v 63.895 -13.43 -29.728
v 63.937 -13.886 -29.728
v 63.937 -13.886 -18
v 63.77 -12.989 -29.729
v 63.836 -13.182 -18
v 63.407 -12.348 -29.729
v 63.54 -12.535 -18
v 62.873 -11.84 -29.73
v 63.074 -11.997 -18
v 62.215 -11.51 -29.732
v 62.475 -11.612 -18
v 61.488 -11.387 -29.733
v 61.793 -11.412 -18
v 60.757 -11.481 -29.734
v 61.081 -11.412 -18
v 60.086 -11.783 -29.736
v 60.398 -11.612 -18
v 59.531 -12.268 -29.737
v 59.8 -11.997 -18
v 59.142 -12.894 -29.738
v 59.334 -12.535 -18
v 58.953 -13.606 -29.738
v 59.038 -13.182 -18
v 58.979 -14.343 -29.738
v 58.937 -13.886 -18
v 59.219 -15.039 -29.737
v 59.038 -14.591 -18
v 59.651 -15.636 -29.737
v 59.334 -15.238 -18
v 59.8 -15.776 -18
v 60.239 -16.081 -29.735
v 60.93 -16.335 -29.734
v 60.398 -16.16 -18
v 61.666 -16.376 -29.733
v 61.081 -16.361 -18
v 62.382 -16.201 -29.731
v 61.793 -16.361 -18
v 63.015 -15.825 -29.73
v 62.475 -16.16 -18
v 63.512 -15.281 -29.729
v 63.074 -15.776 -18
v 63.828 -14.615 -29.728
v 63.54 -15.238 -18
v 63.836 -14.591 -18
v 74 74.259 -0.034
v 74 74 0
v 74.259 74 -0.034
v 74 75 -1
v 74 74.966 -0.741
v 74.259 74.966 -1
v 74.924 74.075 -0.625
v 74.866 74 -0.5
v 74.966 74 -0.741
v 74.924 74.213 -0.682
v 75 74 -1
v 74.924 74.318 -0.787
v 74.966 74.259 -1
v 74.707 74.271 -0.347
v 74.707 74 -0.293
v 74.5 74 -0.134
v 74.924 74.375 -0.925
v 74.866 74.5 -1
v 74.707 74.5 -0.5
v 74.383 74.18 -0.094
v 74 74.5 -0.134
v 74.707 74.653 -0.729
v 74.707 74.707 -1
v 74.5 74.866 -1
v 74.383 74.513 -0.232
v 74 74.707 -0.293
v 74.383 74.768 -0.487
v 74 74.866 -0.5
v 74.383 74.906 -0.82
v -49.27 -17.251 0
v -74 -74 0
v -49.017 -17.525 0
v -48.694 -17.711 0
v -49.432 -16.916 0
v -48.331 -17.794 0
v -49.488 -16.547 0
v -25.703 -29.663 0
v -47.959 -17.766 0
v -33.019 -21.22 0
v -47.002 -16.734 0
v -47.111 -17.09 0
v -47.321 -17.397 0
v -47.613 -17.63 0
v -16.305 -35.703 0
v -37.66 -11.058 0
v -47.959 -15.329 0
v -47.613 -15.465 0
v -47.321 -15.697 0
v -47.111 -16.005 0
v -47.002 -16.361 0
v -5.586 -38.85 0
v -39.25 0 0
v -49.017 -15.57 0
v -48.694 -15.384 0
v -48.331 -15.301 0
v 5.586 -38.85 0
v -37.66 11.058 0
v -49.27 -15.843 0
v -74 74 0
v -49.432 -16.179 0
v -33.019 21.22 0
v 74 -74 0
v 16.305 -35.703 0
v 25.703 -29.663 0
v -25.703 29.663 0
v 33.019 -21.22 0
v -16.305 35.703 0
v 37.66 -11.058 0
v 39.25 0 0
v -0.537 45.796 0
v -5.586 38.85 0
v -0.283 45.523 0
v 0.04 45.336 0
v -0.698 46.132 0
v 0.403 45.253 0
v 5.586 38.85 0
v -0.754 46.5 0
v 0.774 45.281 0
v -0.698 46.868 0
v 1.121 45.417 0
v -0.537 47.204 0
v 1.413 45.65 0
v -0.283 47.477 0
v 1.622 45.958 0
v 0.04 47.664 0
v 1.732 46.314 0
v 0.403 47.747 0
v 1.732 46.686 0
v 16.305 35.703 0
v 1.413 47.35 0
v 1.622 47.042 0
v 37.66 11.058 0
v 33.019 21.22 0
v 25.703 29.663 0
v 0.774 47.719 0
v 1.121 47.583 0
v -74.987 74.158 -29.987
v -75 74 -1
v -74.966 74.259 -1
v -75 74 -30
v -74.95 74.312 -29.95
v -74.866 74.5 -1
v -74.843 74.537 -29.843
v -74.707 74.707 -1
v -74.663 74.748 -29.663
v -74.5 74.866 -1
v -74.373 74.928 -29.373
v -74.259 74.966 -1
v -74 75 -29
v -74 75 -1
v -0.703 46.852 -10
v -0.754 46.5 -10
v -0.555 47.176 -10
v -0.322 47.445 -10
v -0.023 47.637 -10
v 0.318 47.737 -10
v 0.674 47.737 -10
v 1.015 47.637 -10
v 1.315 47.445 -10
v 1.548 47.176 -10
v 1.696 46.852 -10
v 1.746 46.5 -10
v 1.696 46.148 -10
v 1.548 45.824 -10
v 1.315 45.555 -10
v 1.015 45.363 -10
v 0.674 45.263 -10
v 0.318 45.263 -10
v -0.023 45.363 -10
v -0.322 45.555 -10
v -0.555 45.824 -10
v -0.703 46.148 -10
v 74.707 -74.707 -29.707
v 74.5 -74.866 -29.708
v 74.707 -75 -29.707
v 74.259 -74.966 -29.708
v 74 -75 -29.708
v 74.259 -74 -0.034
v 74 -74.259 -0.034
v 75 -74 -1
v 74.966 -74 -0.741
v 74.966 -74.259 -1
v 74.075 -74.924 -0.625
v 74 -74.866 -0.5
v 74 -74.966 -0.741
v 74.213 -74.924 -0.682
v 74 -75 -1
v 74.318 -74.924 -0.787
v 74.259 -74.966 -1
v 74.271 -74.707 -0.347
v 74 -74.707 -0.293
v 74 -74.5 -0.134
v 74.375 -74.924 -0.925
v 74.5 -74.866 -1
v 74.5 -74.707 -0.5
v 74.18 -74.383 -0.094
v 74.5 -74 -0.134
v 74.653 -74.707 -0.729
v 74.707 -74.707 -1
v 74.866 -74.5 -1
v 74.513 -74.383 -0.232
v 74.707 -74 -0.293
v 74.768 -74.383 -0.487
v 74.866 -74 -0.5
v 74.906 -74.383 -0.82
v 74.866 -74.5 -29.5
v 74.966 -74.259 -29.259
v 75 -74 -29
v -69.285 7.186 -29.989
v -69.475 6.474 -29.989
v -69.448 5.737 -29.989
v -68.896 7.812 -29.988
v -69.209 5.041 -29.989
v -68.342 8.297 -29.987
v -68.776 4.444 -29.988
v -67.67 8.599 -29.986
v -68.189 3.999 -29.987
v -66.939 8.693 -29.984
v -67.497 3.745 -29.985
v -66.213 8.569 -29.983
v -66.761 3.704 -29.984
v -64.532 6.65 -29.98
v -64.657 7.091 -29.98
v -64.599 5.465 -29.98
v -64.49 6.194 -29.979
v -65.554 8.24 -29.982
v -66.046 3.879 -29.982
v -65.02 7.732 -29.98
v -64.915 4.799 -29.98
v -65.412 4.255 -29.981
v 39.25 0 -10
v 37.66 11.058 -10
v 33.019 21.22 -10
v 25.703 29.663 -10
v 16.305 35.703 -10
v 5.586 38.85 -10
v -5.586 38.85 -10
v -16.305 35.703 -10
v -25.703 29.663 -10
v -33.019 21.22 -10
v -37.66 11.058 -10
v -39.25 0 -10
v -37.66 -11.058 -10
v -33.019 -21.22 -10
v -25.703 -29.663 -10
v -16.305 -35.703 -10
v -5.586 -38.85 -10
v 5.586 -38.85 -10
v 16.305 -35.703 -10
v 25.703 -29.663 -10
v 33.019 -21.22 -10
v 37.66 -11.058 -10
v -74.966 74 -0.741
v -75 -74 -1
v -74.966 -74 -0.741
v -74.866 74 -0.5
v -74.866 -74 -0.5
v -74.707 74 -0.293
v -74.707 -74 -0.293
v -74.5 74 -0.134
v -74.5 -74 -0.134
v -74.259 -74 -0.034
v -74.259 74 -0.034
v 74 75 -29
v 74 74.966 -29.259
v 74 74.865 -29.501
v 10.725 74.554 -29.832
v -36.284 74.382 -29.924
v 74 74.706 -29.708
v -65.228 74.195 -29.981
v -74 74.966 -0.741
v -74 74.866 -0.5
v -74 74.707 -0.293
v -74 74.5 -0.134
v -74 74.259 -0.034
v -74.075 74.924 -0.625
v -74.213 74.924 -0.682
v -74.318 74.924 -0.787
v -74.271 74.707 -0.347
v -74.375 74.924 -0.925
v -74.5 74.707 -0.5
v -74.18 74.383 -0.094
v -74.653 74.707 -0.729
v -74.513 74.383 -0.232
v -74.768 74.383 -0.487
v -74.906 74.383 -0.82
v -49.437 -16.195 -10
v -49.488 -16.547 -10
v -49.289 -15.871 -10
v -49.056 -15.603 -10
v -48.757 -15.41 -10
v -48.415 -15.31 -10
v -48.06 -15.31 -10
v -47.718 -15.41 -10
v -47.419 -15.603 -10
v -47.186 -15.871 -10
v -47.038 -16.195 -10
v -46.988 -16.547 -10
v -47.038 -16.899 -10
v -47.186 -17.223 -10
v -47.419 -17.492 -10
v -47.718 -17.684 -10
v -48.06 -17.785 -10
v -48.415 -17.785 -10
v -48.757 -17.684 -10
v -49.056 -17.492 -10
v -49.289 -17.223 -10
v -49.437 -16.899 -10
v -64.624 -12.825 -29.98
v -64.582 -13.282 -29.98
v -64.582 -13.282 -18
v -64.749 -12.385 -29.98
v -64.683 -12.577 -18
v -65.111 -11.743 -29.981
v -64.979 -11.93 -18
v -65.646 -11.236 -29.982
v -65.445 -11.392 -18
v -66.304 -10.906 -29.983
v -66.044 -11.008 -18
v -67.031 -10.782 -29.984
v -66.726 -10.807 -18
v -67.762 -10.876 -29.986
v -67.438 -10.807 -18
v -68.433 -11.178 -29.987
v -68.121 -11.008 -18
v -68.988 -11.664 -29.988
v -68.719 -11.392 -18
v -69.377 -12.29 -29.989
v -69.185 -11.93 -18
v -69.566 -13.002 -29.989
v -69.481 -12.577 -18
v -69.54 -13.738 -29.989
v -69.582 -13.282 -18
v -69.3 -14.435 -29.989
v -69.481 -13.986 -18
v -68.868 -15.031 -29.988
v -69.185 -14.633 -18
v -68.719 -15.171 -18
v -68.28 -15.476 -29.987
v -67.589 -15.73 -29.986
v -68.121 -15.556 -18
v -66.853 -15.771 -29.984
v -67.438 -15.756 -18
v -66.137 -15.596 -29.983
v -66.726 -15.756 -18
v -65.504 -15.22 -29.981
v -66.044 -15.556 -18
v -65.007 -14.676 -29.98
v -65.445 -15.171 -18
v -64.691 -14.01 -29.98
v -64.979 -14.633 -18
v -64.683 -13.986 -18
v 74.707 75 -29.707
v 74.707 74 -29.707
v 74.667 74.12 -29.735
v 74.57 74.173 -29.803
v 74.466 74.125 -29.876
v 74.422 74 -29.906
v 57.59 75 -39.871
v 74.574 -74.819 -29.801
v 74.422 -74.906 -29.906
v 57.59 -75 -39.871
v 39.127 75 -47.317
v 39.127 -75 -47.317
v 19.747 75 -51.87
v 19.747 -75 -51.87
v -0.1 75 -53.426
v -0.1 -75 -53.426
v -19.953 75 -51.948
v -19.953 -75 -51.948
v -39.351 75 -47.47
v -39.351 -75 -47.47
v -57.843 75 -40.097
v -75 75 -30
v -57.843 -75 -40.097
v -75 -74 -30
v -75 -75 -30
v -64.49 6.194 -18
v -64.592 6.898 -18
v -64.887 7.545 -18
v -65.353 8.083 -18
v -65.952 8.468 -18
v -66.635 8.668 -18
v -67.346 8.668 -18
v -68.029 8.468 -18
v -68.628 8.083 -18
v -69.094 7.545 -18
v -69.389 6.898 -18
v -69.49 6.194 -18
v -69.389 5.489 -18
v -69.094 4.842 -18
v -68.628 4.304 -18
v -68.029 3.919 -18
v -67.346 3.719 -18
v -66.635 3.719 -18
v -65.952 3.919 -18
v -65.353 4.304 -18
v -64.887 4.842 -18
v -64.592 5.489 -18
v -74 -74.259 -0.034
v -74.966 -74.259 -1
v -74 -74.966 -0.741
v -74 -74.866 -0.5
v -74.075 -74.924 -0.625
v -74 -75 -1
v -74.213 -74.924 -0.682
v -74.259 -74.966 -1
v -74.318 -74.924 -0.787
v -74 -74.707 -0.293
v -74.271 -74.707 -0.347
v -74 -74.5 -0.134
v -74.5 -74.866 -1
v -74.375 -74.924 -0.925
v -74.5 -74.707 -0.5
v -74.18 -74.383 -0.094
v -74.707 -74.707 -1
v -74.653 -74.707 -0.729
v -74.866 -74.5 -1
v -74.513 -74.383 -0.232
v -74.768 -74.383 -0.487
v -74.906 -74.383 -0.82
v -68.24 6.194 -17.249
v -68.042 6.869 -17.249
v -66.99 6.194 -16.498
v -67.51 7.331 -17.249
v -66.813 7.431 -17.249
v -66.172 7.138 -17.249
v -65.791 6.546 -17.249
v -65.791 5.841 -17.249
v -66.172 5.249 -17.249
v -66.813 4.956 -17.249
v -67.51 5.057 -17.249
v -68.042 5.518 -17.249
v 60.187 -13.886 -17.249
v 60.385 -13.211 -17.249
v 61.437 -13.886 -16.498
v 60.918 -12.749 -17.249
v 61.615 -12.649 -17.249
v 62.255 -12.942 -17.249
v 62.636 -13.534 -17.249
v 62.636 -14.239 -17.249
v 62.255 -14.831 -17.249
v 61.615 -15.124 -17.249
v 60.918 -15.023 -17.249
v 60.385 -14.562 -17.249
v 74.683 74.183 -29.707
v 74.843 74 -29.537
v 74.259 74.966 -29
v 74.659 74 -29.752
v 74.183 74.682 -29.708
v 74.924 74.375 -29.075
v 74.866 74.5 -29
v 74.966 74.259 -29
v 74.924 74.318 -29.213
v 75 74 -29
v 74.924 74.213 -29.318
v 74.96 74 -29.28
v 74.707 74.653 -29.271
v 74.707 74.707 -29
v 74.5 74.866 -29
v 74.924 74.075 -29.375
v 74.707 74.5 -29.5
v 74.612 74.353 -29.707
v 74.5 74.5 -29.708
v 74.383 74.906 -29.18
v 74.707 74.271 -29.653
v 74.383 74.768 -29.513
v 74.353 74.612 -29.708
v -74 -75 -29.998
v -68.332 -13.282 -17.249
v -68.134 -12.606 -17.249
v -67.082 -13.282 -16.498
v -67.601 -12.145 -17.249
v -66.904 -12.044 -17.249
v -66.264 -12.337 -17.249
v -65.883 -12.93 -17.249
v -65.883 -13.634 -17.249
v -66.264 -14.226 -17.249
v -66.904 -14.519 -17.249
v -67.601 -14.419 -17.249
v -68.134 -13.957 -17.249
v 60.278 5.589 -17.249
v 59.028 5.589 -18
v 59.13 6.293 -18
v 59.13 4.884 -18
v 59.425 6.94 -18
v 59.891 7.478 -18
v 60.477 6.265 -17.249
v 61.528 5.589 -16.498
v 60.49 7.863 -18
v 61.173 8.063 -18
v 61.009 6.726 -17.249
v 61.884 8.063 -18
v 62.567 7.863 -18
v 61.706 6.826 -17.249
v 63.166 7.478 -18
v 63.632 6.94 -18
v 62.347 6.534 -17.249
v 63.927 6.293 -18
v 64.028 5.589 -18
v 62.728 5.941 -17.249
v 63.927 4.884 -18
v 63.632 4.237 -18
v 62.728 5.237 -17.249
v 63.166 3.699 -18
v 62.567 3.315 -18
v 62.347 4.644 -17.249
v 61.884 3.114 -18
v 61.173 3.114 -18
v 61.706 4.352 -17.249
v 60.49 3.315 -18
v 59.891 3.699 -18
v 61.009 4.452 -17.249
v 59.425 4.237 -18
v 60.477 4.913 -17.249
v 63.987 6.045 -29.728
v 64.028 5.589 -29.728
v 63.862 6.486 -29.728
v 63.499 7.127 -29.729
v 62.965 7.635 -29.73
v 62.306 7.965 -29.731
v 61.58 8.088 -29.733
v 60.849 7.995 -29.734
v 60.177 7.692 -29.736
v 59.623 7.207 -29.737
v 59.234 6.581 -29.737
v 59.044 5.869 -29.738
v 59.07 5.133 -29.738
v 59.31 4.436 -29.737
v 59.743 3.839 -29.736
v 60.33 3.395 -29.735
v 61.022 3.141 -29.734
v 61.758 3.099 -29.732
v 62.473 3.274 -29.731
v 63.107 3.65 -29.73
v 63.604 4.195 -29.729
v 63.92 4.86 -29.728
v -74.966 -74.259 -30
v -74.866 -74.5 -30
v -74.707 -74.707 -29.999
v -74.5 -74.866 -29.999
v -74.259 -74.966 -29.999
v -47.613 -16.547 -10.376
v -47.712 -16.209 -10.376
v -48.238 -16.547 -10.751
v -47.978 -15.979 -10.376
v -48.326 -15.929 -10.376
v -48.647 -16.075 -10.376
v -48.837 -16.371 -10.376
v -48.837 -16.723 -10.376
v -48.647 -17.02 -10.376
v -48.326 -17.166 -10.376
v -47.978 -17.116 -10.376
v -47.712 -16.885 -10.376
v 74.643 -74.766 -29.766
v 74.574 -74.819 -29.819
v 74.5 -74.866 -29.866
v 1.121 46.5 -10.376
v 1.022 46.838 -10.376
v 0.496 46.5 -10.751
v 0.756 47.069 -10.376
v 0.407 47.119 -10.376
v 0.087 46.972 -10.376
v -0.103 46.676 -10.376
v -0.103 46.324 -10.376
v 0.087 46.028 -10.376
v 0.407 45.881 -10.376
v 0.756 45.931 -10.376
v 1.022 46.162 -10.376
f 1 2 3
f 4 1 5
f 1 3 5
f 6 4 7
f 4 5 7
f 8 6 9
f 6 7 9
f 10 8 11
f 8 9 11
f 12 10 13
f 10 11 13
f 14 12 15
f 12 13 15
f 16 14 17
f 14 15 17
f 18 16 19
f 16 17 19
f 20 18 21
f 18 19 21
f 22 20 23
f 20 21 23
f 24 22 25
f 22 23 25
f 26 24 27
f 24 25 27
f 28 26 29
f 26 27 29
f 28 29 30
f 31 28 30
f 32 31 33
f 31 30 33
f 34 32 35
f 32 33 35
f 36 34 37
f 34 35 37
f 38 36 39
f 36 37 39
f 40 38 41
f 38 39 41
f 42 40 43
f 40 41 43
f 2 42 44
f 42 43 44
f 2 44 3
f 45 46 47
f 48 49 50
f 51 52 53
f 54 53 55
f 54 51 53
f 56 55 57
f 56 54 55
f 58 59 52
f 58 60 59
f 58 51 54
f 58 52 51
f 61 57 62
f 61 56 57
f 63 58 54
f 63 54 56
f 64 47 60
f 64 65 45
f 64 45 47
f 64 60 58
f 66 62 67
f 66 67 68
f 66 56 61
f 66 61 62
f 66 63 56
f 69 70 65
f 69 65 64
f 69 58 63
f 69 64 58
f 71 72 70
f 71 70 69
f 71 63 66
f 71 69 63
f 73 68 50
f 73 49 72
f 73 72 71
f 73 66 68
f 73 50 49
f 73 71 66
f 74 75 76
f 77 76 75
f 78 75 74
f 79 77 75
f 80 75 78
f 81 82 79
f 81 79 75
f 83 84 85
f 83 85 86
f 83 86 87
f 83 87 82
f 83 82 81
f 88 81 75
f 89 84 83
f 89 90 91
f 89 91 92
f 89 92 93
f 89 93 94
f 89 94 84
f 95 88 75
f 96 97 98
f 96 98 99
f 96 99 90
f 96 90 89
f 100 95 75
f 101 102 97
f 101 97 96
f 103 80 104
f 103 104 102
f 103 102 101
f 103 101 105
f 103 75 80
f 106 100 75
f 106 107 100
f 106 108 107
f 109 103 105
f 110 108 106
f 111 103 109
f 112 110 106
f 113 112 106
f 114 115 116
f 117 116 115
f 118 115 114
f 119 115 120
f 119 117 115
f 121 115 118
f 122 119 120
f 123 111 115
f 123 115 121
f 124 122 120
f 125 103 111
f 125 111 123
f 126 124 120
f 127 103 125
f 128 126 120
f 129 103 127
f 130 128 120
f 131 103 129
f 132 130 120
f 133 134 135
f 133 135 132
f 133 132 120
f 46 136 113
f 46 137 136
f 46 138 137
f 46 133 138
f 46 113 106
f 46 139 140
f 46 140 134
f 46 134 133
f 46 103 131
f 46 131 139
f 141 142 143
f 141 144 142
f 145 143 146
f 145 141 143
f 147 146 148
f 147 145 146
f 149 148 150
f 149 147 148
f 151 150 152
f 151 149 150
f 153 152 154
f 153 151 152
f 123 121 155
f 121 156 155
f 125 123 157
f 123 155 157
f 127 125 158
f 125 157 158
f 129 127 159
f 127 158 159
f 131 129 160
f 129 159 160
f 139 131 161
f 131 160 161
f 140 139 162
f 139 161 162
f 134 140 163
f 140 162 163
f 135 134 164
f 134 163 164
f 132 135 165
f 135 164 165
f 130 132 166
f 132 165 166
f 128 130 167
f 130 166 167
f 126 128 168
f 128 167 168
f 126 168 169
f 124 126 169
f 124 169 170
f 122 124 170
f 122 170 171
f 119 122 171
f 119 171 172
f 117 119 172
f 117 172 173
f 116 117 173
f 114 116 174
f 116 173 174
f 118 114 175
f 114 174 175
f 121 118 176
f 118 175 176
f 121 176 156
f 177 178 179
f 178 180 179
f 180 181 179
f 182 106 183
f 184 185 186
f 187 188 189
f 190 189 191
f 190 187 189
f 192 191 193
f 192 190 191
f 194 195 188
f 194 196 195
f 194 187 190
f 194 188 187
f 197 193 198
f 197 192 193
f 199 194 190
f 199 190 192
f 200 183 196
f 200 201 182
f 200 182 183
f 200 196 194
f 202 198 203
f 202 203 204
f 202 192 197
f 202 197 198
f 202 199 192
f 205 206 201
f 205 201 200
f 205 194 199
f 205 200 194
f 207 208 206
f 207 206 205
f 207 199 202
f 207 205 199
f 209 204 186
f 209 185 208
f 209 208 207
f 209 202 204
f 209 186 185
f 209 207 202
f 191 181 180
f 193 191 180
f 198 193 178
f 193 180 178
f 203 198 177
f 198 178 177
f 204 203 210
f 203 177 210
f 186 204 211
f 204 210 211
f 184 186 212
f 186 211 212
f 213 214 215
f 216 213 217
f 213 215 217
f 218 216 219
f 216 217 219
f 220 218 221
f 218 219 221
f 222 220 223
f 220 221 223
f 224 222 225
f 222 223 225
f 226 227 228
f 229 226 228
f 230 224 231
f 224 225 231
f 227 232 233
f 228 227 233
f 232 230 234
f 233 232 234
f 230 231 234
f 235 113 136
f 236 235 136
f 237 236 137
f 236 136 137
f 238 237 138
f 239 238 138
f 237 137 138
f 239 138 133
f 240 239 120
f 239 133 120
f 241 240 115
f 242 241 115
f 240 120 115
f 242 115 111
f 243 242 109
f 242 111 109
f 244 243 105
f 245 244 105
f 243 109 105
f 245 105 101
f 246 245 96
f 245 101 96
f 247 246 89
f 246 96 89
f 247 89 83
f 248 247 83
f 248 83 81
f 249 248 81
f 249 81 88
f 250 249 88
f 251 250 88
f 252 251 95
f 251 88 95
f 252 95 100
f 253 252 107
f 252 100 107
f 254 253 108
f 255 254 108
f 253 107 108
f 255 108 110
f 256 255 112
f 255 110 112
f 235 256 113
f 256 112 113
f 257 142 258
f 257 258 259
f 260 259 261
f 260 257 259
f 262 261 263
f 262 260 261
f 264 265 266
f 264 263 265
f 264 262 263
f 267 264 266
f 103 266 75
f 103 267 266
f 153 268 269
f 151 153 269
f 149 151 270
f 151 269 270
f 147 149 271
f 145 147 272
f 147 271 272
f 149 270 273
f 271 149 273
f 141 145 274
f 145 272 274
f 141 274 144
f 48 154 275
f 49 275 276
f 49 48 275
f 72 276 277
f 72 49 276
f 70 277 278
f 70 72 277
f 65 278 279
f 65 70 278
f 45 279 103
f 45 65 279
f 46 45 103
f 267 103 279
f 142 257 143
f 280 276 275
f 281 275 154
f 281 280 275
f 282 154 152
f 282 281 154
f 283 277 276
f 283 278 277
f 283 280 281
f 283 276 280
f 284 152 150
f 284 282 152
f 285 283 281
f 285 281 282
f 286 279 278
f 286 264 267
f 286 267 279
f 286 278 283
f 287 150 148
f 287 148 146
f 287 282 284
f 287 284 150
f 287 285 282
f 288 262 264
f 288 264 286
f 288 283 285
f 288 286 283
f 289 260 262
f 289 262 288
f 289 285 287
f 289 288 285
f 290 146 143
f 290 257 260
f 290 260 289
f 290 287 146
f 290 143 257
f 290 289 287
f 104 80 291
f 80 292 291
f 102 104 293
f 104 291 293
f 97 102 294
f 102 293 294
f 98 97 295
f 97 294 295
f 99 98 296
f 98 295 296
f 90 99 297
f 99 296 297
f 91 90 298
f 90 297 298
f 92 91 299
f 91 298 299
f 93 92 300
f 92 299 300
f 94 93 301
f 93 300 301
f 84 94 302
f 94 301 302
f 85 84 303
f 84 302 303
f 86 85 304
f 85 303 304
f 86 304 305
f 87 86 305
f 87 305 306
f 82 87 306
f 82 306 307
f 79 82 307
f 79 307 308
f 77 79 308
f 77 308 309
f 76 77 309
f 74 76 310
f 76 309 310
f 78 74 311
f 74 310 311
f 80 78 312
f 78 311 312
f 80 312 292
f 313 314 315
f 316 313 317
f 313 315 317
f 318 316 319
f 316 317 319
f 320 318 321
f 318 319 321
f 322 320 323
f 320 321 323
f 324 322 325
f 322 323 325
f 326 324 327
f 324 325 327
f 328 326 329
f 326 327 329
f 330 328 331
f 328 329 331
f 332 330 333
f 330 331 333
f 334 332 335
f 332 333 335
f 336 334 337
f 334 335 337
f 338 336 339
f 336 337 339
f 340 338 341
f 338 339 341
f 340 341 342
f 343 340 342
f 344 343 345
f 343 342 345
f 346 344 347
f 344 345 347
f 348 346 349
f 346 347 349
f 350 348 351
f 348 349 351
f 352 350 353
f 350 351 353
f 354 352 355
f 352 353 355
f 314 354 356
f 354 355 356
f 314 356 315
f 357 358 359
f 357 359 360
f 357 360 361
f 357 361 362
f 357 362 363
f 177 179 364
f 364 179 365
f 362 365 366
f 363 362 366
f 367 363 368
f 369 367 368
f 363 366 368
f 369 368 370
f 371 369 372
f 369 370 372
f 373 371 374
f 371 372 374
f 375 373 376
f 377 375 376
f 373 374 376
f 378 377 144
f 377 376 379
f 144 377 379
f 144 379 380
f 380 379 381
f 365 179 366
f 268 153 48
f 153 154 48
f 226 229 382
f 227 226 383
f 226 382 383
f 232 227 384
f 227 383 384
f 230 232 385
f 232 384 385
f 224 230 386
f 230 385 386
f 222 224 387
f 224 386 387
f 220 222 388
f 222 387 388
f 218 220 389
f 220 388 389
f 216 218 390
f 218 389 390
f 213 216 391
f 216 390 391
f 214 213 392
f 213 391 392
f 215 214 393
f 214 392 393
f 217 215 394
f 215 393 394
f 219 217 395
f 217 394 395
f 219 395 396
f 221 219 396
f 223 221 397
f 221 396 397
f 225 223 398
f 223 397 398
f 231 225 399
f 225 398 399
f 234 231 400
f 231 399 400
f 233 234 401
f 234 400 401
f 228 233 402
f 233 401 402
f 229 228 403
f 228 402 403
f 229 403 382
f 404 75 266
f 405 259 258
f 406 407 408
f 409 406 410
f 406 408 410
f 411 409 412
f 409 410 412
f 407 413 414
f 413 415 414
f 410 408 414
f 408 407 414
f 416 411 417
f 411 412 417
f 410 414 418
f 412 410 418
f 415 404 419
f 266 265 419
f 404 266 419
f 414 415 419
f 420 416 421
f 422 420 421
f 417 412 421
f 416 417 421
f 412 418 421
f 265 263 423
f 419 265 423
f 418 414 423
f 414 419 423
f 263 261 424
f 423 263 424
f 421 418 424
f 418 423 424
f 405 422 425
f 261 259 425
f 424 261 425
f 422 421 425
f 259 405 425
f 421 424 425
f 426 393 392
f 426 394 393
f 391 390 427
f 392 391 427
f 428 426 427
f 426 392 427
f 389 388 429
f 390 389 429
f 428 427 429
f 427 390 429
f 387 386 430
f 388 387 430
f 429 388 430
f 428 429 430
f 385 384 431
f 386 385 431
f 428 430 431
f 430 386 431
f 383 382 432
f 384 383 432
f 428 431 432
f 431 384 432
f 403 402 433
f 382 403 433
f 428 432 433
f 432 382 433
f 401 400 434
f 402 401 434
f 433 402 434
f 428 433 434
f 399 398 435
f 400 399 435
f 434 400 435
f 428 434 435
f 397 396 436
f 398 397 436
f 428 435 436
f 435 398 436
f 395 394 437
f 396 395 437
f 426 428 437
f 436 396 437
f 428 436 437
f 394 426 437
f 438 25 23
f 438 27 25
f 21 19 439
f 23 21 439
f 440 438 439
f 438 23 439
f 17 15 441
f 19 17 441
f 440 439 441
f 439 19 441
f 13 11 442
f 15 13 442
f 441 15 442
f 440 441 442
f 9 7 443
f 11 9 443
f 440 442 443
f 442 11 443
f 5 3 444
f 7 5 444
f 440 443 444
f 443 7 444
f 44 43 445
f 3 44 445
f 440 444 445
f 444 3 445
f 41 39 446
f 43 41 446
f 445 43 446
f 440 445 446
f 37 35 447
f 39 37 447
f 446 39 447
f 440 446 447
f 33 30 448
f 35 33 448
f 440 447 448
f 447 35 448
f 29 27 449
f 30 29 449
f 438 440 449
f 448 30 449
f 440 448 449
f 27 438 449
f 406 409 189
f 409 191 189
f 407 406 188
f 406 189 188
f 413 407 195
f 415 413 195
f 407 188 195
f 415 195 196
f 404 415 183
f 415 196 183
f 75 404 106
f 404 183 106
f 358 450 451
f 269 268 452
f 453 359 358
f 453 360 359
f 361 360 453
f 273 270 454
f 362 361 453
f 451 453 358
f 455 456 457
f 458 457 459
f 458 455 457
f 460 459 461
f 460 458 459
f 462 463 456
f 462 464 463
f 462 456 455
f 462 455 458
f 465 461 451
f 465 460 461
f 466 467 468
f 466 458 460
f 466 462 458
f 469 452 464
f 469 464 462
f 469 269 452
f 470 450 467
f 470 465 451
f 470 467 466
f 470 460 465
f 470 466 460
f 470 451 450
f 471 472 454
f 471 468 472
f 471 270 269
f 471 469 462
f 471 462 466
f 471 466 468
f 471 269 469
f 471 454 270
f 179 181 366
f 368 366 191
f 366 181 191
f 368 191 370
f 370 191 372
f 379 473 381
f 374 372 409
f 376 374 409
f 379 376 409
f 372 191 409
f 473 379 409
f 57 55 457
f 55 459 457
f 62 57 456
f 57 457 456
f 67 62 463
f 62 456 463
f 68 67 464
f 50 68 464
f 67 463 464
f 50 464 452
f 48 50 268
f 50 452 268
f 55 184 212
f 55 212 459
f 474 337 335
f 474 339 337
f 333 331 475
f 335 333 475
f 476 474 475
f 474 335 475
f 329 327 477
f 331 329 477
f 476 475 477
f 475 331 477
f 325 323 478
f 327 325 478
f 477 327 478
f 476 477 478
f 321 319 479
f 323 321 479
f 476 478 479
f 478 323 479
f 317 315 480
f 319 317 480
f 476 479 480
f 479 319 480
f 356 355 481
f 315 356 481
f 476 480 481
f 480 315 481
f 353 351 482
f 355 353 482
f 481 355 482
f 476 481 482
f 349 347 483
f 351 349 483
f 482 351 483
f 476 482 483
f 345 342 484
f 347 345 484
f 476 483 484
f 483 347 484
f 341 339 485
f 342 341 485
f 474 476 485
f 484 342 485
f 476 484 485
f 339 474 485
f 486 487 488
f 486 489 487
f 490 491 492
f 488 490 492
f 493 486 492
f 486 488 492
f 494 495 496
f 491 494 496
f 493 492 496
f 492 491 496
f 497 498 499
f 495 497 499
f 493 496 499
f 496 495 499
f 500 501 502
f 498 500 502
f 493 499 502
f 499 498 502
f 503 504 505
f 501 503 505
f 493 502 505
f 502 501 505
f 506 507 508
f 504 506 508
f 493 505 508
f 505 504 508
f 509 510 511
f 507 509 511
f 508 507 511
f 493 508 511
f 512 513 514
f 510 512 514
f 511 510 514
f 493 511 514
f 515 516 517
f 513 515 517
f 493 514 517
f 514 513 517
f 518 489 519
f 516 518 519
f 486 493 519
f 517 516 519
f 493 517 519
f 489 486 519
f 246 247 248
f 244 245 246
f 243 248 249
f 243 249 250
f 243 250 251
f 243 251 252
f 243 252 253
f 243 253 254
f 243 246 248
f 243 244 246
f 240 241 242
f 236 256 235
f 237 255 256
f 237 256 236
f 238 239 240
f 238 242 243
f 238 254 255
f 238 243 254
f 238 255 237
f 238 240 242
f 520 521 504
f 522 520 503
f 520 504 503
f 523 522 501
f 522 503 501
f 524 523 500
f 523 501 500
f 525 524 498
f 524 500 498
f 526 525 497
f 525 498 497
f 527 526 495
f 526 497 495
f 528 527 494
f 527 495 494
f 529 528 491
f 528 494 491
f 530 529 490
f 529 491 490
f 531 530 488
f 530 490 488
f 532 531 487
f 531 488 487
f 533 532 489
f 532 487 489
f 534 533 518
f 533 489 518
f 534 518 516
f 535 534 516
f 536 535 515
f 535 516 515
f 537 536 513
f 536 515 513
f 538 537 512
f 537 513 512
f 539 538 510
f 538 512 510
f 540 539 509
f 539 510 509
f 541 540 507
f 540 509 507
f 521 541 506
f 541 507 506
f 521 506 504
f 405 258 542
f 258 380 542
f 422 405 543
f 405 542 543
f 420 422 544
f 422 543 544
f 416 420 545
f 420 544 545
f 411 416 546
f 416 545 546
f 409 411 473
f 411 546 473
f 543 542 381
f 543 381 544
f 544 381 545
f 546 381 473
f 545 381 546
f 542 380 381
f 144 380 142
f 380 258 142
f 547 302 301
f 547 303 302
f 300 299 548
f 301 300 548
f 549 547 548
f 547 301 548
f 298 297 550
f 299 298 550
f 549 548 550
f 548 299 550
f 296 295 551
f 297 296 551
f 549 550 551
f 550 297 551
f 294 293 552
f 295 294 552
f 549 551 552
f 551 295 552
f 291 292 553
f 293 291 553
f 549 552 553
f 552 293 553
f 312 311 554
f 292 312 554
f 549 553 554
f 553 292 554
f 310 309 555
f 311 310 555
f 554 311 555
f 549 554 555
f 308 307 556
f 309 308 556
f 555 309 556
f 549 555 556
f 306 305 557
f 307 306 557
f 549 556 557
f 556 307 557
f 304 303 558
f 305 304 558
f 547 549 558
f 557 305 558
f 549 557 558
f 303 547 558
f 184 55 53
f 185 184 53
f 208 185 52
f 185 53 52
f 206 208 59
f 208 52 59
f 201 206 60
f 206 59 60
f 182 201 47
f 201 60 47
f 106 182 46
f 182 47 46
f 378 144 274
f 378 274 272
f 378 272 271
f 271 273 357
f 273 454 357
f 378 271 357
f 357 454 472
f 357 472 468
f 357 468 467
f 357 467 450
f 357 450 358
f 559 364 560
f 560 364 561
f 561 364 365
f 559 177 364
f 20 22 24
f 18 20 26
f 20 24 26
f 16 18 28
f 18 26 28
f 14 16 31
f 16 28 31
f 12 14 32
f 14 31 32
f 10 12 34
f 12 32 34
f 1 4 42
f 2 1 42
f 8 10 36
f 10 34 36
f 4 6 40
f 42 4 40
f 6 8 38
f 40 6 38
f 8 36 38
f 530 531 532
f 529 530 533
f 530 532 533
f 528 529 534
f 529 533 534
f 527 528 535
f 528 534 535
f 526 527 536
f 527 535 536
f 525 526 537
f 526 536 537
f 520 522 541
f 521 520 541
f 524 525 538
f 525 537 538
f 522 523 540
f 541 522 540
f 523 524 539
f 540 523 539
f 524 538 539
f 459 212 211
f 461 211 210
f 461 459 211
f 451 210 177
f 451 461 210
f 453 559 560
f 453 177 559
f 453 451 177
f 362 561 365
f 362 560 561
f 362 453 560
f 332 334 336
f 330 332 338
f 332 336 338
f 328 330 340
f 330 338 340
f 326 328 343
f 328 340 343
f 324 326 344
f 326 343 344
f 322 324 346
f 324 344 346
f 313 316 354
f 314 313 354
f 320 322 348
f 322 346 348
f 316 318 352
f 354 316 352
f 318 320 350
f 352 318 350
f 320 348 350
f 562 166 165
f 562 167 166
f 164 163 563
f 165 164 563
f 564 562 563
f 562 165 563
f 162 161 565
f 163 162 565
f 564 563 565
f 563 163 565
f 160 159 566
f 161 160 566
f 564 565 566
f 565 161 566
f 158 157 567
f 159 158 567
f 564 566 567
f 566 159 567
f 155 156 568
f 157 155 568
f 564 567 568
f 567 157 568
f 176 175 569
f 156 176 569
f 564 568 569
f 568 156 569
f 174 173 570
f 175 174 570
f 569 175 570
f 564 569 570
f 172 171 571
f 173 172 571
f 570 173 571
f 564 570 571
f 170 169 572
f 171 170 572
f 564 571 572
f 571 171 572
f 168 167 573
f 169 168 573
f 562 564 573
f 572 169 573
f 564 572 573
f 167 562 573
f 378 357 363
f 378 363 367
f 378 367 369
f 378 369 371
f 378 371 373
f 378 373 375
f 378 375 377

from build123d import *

# Parameters (mm, degrees)
SKETCH1_W                       = 150
SKETCH1_H                       = 150
BOSS_EXTRUDE1_DEPTH             = 30
FILLET1_R                       = 1
SKETCH2_R                       = 39.25
CUT_EXTRUDE4_DEPTH              = 10
TAP_DRILL_FOR_M6X1_0_TAP1_D     = 5
TAP_DRILL_FOR_M6X1_0_TAP1_DEPTH = 12
TAP_DRILL_FOR_M6X1_0_TAP1_TIP   = 1.502151548
BOSS_EXTRUDE2_DEPTH             = 150
TAP_DRILL_FOR_M3X0_5_TAP3_D     = 2.5
TAP_DRILL_FOR_M3X0_5_TAP3_DEPTH = 10
TAP_DRILL_FOR_M3X0_5_TAP3_TIP   = 0.751075774


with BuildPart() as part:
    # Sketch1 → Boss-Extrude1 (new body)
    with BuildSketch(Plane.XY):
        Rectangle(SKETCH1_W, SKETCH1_H)
    extrude(amount=-BOSS_EXTRUDE1_DEPTH)

    # Fillet1
    fillet1_edges = [part.edges().sort_by_distance(p)[0] for p in [
        (0, 75, -30),
        (-75, 0, 0),
        (0, 75, 0),
        (75, 0, 0),
        (0, -75, 0),
        (-75, -75, -15),
        (-75, 75, -15),
        (75, 75, -15),
        (75, -75, -15),
        (75, 0, -30),
    ]]
    fillet(fillet1_edges, radius=FILLET1_R)

    # Sketch2 → Cut-Extrude4 (cut)
    with BuildSketch(Plane.XY):
        Circle(SKETCH2_R)
    extrude(amount=-CUT_EXTRUDE4_DEPTH, mode=Mode.SUBTRACT)

    # Tap Drill for M6x1.0 Tap1
    with Locations(Plane(origin=(0, 0, -30), x_dir=(-1, 0, 0), z_dir=(0, 0, -1))):
        with Locations((-61.528492196, 5.588819372), (-61.436853723, -13.886414682), (66.990456482, 6.193550496), (67.082094955, -13.281683558)):
            Hole(TAP_DRILL_FOR_M6X1_0_TAP1_D / 2, depth=TAP_DRILL_FOR_M6X1_0_TAP1_DEPTH)
            with Locations((0, 0, -(TAP_DRILL_FOR_M6X1_0_TAP1_DEPTH + TAP_DRILL_FOR_M6X1_0_TAP1_TIP / 2))):  # 118° drill point
                Cone(0, TAP_DRILL_FOR_M6X1_0_TAP1_D / 2, TAP_DRILL_FOR_M6X1_0_TAP1_TIP, mode=Mode.SUBTRACT)

    # Sketch11 → Boss-Extrude2 (add)
    with BuildSketch(Plane.XZ.offset(75)):
        with BuildLine():
            Line((-75, -30), (74.707106781, -29.707106781))
            ThreePointArc((74.707106781, -29.707106781), (-0.100328988, -53.42574699), (-75, -30))
        make_face()
    extrude(amount=-BOSS_EXTRUDE2_DEPTH)

    # Tap Drill for M3x0.5 Tap3
    with Locations(Plane.XY):
        with Locations((0.496213053, 46.5), (-48.237547134, -16.547252974)):
            Hole(TAP_DRILL_FOR_M3X0_5_TAP3_D / 2, depth=TAP_DRILL_FOR_M3X0_5_TAP3_DEPTH)
            with Locations((0, 0, -(TAP_DRILL_FOR_M3X0_5_TAP3_DEPTH + TAP_DRILL_FOR_M3X0_5_TAP3_TIP / 2))):  # 118° drill point
                Cone(0, TAP_DRILL_FOR_M3X0_5_TAP3_D / 2, TAP_DRILL_FOR_M3X0_5_TAP3_TIP, mode=Mode.SUBTRACT)


solid = part.part
